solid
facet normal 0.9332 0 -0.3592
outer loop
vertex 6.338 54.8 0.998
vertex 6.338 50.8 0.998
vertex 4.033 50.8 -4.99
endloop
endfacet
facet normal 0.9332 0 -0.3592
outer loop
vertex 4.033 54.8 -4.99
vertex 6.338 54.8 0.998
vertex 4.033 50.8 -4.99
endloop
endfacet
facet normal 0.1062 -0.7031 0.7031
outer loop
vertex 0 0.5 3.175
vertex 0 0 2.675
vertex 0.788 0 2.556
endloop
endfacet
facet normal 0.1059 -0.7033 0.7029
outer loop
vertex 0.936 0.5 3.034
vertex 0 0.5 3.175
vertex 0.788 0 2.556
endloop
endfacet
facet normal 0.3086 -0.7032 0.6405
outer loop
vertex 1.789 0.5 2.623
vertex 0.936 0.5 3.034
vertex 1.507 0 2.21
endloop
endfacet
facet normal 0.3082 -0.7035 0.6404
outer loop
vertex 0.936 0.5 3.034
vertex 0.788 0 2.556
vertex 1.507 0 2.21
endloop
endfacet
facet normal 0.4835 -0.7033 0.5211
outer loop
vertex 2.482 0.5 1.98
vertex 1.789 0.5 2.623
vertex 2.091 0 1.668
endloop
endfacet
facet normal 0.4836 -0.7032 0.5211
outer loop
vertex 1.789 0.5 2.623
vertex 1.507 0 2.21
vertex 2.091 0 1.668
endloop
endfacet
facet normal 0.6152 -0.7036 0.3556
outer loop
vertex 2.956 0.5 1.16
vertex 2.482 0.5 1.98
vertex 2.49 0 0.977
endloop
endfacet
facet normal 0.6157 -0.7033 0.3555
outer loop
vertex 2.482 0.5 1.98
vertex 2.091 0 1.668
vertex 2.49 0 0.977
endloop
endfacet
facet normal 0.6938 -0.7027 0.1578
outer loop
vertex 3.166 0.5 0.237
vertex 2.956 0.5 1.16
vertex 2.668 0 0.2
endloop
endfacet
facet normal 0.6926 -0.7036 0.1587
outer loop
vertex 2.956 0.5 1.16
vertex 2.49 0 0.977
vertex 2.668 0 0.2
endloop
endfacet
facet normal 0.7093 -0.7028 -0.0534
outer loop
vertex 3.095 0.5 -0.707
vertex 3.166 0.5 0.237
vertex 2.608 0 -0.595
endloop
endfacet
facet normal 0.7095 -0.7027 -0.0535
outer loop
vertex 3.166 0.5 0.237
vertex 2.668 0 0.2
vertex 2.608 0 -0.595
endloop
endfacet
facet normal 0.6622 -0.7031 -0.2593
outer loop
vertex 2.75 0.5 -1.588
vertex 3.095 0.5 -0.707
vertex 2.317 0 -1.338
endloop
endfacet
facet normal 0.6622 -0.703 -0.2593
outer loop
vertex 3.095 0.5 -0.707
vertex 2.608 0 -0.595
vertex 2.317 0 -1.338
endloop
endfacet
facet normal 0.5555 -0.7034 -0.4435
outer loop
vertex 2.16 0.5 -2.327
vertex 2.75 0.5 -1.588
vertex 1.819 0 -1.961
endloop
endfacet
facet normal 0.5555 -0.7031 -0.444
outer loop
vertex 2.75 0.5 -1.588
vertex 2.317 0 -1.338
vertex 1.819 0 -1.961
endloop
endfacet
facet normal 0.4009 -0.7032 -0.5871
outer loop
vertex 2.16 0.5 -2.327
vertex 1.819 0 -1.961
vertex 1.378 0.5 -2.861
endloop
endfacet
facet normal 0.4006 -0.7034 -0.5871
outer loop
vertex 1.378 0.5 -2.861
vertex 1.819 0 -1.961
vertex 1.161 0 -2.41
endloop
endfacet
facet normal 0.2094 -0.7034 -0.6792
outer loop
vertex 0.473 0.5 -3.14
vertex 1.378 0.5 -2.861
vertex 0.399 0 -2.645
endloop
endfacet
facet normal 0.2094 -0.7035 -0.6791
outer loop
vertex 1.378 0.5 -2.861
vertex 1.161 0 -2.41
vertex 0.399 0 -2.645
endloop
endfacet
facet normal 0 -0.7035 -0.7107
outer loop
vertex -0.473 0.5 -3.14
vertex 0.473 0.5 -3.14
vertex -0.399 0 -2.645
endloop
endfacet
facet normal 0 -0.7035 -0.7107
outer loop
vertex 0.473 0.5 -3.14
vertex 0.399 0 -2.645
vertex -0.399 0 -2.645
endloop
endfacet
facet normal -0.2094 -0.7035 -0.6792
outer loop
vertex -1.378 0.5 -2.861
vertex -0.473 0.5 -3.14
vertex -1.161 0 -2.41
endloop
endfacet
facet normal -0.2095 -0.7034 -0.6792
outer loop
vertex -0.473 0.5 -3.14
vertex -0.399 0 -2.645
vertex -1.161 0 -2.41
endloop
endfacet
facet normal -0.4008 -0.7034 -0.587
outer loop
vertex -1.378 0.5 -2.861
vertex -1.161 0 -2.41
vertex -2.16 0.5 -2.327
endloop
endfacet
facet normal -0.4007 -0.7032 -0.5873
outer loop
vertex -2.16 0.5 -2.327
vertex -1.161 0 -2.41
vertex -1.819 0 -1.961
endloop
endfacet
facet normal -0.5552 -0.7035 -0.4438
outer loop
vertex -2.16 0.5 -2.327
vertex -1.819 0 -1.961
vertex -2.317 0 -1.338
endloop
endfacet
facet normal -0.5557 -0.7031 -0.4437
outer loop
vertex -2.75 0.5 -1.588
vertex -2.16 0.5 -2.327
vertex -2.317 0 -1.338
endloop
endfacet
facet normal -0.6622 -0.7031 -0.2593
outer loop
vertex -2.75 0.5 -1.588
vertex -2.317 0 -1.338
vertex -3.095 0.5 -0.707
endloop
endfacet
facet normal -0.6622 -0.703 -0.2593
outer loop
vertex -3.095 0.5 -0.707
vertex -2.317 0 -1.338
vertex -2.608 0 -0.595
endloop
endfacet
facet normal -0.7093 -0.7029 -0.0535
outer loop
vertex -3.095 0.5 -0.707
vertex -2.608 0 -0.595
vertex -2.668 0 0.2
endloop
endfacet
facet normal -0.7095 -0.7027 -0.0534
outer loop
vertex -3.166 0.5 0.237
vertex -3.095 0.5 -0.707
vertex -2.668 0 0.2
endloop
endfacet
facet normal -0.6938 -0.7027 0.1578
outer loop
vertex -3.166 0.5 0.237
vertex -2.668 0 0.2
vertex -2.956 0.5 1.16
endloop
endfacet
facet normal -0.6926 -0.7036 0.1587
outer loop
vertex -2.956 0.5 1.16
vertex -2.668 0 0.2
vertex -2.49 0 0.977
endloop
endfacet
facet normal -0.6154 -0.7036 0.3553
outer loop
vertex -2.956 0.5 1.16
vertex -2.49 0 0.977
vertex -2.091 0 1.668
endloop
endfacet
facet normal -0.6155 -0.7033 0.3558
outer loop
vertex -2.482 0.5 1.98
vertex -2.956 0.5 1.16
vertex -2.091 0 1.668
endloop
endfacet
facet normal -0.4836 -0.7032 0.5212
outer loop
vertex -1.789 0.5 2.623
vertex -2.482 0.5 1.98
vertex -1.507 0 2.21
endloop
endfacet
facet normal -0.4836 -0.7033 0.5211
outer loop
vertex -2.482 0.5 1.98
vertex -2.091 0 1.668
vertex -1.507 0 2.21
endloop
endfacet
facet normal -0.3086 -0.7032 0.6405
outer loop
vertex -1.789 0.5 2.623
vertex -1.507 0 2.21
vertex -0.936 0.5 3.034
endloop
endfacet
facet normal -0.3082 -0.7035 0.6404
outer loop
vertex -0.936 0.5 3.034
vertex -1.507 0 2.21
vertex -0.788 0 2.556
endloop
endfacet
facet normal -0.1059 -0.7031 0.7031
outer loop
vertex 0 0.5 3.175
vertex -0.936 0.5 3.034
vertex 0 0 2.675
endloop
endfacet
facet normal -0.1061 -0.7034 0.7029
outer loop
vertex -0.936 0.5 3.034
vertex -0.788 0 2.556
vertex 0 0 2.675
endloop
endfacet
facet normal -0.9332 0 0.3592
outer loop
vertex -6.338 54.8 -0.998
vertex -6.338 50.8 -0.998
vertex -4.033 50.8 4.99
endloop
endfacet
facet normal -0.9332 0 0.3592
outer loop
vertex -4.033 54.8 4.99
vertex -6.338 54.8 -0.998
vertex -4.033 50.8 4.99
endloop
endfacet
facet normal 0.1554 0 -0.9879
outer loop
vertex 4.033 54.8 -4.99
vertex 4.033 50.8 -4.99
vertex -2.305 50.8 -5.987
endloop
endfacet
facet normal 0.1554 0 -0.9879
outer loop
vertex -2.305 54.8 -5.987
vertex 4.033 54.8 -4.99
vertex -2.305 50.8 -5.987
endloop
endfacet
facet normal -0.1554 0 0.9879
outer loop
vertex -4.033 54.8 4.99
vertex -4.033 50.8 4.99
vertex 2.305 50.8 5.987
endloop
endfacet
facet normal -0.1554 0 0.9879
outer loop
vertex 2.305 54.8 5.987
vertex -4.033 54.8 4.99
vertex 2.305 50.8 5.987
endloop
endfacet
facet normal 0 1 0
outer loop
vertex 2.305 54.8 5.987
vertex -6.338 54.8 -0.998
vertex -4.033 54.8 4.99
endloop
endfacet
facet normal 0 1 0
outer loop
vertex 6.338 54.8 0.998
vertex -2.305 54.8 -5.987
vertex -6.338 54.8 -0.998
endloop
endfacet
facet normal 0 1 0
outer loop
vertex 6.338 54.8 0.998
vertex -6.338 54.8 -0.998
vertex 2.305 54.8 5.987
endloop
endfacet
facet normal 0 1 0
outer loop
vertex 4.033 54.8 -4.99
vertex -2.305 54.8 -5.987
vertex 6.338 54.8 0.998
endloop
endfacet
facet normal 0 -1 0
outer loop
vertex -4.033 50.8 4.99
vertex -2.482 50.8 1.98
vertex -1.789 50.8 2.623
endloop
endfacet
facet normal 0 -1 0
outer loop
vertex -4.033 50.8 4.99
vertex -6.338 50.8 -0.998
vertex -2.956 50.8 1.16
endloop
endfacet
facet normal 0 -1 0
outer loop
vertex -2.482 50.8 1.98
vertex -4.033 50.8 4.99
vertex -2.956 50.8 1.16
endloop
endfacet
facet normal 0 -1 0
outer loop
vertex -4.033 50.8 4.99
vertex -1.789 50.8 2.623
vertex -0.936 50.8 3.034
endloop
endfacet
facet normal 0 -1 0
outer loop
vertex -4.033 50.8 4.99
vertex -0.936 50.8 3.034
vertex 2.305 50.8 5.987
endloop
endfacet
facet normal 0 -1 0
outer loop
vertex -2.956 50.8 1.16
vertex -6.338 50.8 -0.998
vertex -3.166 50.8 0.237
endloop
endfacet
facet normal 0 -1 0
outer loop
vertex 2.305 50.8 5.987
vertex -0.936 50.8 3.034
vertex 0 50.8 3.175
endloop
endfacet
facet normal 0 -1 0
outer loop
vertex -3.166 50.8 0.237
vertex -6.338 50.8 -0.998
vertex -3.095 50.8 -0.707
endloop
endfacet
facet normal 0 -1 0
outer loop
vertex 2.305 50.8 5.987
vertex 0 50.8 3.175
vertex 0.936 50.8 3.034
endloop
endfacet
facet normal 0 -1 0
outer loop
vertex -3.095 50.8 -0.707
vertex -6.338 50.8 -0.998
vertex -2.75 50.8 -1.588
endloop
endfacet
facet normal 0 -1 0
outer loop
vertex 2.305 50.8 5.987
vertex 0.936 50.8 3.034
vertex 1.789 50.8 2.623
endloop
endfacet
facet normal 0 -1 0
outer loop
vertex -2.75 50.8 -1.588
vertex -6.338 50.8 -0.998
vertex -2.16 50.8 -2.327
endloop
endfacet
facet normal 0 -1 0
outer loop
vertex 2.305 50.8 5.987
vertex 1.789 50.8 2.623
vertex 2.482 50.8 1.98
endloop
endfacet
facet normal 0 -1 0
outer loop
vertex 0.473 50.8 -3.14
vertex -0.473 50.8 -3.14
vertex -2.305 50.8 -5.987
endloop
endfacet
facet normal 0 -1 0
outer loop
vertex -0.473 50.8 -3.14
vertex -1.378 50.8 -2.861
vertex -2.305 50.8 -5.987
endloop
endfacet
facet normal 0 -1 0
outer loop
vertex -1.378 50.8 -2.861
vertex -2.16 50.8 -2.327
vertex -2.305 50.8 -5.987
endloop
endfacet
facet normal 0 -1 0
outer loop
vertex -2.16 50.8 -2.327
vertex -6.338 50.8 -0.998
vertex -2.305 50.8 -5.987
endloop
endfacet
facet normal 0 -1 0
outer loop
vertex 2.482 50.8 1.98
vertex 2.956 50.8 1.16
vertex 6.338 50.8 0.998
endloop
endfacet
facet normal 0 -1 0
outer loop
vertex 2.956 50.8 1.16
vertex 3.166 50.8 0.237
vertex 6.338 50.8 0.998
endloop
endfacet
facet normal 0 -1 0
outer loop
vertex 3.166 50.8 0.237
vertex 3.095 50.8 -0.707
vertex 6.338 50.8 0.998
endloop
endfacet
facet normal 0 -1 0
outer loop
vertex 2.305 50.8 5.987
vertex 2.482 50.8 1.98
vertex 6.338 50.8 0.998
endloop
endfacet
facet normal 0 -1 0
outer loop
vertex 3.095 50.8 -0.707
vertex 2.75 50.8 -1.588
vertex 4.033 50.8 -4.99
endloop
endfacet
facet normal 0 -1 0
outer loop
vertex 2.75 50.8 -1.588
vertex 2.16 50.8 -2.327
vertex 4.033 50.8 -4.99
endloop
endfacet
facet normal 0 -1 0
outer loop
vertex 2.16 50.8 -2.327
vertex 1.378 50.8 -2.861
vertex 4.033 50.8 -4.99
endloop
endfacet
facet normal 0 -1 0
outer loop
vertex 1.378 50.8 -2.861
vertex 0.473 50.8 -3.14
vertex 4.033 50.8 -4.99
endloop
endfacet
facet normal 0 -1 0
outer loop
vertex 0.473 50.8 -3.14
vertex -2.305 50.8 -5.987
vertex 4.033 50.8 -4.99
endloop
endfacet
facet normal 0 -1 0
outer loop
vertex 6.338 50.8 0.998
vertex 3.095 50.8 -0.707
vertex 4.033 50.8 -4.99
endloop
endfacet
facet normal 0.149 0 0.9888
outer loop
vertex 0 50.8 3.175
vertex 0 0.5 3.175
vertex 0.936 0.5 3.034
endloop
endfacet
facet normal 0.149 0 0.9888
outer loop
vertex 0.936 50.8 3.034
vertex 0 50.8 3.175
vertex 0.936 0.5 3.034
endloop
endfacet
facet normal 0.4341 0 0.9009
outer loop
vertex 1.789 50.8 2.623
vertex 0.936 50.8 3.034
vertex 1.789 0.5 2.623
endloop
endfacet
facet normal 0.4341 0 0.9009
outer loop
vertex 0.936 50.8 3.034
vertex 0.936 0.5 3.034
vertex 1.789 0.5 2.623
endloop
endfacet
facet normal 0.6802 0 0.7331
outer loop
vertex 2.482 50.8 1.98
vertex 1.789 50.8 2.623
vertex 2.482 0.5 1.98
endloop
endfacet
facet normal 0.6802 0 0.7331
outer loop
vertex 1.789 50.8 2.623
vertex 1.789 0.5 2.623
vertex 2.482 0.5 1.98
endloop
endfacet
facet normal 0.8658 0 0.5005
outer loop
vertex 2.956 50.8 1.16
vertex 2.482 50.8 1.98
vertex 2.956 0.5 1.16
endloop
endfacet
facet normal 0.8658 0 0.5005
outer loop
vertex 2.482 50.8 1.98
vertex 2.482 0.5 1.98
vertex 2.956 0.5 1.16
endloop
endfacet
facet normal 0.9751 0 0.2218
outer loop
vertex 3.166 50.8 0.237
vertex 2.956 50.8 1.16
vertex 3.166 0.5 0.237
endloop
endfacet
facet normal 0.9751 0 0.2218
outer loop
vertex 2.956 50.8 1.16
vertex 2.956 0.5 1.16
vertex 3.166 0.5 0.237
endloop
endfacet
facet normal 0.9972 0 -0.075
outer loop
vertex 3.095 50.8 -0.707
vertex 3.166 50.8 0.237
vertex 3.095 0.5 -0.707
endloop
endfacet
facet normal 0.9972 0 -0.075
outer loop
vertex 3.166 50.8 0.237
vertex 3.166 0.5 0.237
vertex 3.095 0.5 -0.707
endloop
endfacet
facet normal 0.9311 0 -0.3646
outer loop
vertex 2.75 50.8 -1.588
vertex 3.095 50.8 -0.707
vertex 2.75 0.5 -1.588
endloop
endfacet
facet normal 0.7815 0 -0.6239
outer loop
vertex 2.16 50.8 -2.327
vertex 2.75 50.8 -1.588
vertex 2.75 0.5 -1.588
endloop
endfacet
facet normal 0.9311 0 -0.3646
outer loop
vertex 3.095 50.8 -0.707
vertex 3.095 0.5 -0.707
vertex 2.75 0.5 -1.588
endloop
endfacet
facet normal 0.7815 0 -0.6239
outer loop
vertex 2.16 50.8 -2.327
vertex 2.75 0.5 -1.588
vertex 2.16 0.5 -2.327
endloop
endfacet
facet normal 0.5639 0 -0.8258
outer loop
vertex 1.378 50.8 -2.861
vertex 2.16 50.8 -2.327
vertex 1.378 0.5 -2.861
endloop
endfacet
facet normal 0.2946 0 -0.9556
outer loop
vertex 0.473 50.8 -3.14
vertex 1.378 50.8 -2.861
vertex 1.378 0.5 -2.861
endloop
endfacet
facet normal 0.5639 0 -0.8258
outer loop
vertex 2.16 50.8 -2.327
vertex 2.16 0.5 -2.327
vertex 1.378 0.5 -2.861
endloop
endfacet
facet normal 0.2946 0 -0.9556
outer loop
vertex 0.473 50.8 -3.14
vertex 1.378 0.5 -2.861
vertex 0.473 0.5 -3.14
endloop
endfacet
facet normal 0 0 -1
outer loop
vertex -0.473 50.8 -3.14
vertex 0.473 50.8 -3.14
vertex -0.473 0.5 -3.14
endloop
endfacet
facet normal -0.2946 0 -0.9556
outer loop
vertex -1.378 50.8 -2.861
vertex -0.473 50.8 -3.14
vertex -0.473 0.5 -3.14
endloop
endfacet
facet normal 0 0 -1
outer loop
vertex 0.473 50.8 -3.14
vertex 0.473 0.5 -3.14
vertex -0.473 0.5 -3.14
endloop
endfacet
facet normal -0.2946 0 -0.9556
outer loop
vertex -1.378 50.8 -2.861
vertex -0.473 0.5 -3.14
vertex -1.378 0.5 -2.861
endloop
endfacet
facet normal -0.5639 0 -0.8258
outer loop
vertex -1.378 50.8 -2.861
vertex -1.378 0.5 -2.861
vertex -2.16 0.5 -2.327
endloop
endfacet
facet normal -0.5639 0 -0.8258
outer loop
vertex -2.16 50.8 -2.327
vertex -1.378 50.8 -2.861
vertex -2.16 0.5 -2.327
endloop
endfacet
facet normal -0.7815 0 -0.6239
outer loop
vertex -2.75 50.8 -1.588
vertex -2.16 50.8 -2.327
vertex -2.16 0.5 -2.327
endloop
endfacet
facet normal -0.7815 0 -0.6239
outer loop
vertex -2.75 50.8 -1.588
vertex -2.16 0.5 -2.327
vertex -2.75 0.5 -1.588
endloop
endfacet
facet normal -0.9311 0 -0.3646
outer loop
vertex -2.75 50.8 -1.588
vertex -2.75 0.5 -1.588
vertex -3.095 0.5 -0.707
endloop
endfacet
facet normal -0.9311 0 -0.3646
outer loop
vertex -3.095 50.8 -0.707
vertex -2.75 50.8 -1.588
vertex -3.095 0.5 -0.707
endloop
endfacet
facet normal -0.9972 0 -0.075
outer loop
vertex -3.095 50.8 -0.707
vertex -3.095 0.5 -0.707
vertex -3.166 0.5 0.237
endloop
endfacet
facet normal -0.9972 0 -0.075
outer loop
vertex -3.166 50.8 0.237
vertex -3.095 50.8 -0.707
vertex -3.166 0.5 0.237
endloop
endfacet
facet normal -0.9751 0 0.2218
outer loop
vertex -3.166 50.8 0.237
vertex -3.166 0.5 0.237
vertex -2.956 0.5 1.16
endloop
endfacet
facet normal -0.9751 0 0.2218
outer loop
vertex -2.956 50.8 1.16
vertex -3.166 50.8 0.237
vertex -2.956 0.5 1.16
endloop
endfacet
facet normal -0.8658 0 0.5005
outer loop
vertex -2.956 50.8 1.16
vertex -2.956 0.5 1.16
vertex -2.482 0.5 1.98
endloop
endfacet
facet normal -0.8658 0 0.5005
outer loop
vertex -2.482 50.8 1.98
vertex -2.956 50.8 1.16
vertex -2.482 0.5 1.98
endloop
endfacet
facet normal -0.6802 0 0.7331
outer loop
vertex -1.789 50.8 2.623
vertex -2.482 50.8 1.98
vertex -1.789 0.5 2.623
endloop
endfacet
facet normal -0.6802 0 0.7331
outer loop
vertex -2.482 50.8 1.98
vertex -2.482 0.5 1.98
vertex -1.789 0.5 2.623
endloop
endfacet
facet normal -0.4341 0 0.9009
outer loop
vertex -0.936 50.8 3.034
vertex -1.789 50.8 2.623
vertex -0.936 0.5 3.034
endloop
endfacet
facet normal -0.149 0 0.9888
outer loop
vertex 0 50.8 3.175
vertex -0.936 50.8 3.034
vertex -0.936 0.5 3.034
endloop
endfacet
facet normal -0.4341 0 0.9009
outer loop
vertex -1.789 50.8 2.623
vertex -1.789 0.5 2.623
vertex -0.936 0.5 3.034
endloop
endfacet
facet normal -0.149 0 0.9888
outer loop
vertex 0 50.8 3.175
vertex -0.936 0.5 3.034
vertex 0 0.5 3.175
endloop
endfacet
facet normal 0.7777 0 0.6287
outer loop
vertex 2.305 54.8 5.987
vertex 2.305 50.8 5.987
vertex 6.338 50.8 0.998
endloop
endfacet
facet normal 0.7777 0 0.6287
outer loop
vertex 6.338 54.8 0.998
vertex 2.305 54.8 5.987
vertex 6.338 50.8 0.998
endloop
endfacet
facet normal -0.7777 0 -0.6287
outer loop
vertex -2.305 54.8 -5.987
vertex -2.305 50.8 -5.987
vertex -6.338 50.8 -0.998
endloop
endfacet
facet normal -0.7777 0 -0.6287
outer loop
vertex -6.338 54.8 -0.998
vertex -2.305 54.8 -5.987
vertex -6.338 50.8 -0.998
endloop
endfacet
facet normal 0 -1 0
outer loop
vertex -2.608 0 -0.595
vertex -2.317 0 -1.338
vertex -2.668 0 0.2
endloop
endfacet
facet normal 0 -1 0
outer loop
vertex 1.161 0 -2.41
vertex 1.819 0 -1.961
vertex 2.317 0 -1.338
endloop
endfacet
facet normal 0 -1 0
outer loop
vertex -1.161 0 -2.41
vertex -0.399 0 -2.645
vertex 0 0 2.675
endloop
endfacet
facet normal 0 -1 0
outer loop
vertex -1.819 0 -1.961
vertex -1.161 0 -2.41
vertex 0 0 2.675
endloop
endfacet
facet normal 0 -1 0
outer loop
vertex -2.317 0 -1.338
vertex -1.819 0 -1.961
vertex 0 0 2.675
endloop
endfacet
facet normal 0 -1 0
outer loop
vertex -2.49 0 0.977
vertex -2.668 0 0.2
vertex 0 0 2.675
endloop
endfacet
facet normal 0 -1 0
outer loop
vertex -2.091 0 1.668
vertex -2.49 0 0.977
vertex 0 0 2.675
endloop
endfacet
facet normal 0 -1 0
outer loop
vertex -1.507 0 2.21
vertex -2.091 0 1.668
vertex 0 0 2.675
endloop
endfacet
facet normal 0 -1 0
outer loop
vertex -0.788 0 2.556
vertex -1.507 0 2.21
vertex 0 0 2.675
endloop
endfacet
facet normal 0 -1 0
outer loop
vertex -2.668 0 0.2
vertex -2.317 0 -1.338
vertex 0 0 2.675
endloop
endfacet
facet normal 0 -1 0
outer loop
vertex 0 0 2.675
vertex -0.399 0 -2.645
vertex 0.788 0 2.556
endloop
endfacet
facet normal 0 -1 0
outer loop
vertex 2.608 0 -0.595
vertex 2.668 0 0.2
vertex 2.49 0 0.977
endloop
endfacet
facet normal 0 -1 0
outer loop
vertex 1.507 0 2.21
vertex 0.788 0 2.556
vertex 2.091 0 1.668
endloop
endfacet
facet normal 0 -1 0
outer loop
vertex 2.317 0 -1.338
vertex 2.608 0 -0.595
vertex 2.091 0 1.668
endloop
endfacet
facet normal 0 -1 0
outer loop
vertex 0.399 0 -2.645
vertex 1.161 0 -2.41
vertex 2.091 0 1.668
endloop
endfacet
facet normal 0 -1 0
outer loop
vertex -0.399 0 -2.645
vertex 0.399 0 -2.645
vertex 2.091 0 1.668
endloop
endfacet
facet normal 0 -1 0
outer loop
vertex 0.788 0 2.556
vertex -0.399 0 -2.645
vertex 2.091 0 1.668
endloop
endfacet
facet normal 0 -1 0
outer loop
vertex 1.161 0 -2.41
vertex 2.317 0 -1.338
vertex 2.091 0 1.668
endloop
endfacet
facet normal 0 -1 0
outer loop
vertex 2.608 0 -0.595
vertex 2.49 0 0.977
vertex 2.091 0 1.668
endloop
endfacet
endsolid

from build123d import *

# Parameters (mm, degrees)
SKETCH1_R           = 3.175
BOSS_EXTRUDE1_DEPTH = 50.8
BOSS_EXTRUDE2_DEPTH = 4
CHAMFER1_SIZE       = 0.5


with BuildPart() as part:
    # Sketch1 → Boss-Extrude1 (new body)
    with BuildSketch(Plane(origin=(0, 0, 0), x_dir=(1, 0, 0), z_dir=(0, 1, 0))):
        with Locations(Location((0, 0, 0), (0, 0, 270))):
            Circle(SKETCH1_R)
    extrude(amount=BOSS_EXTRUDE1_DEPTH)

    # Sketch2 → Boss-Extrude2 (add)
    with BuildSketch(Plane(origin=(0, 50.8, 0), x_dir=(1, 0, 0), z_dir=(0, 1, 0))):
        Polygon((-2.30492787, 5.987475227), (-6.337769586, 0.997611524), (-4.032841716, -4.989863703), (2.30492787, -5.987475227), (6.337769586, -0.997611524), (4.032841716, 4.989863703), align=None)
    extrude(amount=BOSS_EXTRUDE2_DEPTH)

    # Chamfer1
    chamfer1_edges = [part.edges().sort_by_distance(p)[0] for p in [
        (0, 0, -3.175),
    ]]
    chamfer(chamfer1_edges, length=CHAMFER1_SIZE)


solid = part.part
